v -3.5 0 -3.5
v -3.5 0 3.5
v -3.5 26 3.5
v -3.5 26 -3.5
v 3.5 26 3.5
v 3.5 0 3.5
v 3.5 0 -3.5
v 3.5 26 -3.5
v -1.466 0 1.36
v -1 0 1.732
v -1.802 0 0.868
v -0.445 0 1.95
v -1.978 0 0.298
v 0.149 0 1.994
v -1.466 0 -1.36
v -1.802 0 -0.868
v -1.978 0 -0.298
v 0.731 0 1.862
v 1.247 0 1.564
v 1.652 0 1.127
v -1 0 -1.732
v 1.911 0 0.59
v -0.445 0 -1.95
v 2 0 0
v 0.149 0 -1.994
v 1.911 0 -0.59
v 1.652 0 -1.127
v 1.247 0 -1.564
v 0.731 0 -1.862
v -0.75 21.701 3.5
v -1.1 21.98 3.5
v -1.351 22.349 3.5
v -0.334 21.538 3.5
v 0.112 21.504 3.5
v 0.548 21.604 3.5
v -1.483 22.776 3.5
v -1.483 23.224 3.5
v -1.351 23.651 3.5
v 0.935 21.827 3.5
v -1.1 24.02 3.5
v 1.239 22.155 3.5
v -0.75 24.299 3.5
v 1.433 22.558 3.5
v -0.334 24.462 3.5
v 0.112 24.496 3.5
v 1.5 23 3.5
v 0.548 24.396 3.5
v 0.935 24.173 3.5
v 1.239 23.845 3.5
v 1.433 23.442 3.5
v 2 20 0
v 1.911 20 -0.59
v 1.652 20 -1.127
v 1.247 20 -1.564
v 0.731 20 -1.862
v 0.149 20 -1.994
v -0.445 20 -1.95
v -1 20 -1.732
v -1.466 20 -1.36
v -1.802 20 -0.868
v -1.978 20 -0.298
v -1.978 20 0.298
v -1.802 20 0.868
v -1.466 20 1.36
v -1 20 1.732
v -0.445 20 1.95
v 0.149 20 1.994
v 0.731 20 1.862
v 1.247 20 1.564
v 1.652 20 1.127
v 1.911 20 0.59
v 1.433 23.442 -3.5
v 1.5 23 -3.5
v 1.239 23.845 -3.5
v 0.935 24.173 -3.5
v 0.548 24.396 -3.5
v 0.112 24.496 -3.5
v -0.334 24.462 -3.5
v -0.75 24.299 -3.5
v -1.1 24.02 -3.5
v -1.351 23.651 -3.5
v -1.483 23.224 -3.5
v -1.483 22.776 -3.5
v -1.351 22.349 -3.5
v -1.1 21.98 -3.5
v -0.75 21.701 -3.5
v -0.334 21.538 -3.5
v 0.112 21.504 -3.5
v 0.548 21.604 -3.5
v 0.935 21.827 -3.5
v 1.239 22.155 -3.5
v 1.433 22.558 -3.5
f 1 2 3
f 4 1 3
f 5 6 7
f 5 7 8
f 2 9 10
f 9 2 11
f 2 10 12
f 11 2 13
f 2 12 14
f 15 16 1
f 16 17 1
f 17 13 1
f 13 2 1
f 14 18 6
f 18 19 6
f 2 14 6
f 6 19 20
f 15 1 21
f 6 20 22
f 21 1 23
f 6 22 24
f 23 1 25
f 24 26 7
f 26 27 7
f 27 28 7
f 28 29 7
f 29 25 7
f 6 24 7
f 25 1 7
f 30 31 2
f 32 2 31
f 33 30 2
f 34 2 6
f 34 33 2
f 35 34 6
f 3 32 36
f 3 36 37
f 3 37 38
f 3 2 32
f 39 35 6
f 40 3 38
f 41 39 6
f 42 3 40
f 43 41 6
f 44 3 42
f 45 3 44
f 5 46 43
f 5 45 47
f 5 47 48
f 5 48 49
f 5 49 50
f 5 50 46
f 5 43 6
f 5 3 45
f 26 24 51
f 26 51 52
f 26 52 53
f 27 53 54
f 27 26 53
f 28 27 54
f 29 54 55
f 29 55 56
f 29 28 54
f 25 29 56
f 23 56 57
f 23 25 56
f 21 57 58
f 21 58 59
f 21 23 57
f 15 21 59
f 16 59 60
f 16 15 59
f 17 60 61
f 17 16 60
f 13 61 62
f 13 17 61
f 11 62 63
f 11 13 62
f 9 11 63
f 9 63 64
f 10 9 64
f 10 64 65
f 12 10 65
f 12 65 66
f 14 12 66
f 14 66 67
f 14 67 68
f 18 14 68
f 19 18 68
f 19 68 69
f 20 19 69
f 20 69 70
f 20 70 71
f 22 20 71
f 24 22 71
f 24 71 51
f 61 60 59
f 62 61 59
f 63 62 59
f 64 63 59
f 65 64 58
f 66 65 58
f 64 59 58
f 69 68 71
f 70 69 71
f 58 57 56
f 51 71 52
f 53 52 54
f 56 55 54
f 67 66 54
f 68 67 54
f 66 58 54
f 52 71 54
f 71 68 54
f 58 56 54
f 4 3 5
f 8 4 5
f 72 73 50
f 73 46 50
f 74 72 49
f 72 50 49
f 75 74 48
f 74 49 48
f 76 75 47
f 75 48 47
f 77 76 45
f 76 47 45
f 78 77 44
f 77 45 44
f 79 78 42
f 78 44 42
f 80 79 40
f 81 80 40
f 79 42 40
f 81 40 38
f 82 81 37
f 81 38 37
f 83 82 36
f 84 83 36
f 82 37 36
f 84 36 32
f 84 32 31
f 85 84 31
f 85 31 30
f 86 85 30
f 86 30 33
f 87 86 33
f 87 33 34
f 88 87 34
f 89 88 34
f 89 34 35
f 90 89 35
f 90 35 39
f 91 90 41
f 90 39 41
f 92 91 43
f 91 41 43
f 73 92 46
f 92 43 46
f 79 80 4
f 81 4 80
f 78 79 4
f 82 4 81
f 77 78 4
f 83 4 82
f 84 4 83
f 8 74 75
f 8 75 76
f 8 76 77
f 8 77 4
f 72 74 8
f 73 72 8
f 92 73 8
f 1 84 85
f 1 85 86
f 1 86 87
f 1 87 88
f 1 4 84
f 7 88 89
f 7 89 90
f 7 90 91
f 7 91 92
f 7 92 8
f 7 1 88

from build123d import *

# Parameters (mm, degrees)
SKETCH1_W                       = 7
SKETCH1_H                       = 7
SKETCH1_R                       = 2
BOSS_EXTRUDE1_DEPTH             = 20
BOSS_EXTRUDE2_REACH             = 5.5
SKETCH2_W                       = 7
SKETCH2_H                       = 6
SKETCH2_R                       = 1.5
BOSS_EXTRUDE2_DIRECTION_2_REACH = 5.5


with BuildPart() as part:
    # Sketch1 → Boss-Extrude1 (new body)
    with BuildSketch(Plane(origin=(0, 0, 0), x_dir=(1, 0, 0), z_dir=(0, 1, 0))):
        Rectangle(SKETCH1_W, SKETCH1_H)
        Circle(SKETCH1_R, mode=Mode.SUBTRACT)
    extrude(amount=BOSS_EXTRUDE1_DEPTH)

    # Boss-Extrude2: up to this face of the body (flat: up to its plane)
    boss_extrude2_end = Plane(part.part.faces().sort_by_distance((0, 10, 3.5))[0])
    # Sketch2 → Boss-Extrude2 (add, up to the picked face)
    with BuildSketch(Plane.XY, mode=Mode.PRIVATE) as boss_extrude2_sk1:
        with Locations((0, 23)):
            Rectangle(SKETCH2_W, SKETCH2_H)
        with Locations((0, 23)):
            Circle(SKETCH2_R, mode=Mode.SUBTRACT)
    boss_extrude2_tool1 = split(extrude(boss_extrude2_sk1.sketch, amount=BOSS_EXTRUDE2_REACH, mode=Mode.PRIVATE), bisect_by=boss_extrude2_end, keep=Keep.BOTH, mode=Mode.PRIVATE)
    add(boss_extrude2_tool1.solids().sort_by_distance((0, 25.907805, 0))[0])

    # Boss-Extrude2 direction 2: up to this face of the body (flat: up to its plane)
    boss_extrude2_direction_2_end = Plane(part.part.faces().sort_by_distance((0, 10, -3.5))[0])
    # Sketch2 → Boss-Extrude2 direction 2 (add, up to the picked face)
    with BuildSketch(Plane.XY, mode=Mode.PRIVATE) as boss_extrude2_direction_2_sk1:
        with Locations((0, 23)):
            Rectangle(SKETCH2_W, SKETCH2_H)
        with Locations((0, 23)):
            Circle(SKETCH2_R, mode=Mode.SUBTRACT)
    boss_extrude2_direction_2_tool1 = split(extrude(boss_extrude2_direction_2_sk1.sketch, amount=-BOSS_EXTRUDE2_DIRECTION_2_REACH, mode=Mode.PRIVATE), bisect_by=boss_extrude2_direction_2_end, keep=Keep.BOTH, mode=Mode.PRIVATE)
    add(boss_extrude2_direction_2_tool1.solids().sort_by_distance((0, 25.907805, 0))[0])


solid = part.part
